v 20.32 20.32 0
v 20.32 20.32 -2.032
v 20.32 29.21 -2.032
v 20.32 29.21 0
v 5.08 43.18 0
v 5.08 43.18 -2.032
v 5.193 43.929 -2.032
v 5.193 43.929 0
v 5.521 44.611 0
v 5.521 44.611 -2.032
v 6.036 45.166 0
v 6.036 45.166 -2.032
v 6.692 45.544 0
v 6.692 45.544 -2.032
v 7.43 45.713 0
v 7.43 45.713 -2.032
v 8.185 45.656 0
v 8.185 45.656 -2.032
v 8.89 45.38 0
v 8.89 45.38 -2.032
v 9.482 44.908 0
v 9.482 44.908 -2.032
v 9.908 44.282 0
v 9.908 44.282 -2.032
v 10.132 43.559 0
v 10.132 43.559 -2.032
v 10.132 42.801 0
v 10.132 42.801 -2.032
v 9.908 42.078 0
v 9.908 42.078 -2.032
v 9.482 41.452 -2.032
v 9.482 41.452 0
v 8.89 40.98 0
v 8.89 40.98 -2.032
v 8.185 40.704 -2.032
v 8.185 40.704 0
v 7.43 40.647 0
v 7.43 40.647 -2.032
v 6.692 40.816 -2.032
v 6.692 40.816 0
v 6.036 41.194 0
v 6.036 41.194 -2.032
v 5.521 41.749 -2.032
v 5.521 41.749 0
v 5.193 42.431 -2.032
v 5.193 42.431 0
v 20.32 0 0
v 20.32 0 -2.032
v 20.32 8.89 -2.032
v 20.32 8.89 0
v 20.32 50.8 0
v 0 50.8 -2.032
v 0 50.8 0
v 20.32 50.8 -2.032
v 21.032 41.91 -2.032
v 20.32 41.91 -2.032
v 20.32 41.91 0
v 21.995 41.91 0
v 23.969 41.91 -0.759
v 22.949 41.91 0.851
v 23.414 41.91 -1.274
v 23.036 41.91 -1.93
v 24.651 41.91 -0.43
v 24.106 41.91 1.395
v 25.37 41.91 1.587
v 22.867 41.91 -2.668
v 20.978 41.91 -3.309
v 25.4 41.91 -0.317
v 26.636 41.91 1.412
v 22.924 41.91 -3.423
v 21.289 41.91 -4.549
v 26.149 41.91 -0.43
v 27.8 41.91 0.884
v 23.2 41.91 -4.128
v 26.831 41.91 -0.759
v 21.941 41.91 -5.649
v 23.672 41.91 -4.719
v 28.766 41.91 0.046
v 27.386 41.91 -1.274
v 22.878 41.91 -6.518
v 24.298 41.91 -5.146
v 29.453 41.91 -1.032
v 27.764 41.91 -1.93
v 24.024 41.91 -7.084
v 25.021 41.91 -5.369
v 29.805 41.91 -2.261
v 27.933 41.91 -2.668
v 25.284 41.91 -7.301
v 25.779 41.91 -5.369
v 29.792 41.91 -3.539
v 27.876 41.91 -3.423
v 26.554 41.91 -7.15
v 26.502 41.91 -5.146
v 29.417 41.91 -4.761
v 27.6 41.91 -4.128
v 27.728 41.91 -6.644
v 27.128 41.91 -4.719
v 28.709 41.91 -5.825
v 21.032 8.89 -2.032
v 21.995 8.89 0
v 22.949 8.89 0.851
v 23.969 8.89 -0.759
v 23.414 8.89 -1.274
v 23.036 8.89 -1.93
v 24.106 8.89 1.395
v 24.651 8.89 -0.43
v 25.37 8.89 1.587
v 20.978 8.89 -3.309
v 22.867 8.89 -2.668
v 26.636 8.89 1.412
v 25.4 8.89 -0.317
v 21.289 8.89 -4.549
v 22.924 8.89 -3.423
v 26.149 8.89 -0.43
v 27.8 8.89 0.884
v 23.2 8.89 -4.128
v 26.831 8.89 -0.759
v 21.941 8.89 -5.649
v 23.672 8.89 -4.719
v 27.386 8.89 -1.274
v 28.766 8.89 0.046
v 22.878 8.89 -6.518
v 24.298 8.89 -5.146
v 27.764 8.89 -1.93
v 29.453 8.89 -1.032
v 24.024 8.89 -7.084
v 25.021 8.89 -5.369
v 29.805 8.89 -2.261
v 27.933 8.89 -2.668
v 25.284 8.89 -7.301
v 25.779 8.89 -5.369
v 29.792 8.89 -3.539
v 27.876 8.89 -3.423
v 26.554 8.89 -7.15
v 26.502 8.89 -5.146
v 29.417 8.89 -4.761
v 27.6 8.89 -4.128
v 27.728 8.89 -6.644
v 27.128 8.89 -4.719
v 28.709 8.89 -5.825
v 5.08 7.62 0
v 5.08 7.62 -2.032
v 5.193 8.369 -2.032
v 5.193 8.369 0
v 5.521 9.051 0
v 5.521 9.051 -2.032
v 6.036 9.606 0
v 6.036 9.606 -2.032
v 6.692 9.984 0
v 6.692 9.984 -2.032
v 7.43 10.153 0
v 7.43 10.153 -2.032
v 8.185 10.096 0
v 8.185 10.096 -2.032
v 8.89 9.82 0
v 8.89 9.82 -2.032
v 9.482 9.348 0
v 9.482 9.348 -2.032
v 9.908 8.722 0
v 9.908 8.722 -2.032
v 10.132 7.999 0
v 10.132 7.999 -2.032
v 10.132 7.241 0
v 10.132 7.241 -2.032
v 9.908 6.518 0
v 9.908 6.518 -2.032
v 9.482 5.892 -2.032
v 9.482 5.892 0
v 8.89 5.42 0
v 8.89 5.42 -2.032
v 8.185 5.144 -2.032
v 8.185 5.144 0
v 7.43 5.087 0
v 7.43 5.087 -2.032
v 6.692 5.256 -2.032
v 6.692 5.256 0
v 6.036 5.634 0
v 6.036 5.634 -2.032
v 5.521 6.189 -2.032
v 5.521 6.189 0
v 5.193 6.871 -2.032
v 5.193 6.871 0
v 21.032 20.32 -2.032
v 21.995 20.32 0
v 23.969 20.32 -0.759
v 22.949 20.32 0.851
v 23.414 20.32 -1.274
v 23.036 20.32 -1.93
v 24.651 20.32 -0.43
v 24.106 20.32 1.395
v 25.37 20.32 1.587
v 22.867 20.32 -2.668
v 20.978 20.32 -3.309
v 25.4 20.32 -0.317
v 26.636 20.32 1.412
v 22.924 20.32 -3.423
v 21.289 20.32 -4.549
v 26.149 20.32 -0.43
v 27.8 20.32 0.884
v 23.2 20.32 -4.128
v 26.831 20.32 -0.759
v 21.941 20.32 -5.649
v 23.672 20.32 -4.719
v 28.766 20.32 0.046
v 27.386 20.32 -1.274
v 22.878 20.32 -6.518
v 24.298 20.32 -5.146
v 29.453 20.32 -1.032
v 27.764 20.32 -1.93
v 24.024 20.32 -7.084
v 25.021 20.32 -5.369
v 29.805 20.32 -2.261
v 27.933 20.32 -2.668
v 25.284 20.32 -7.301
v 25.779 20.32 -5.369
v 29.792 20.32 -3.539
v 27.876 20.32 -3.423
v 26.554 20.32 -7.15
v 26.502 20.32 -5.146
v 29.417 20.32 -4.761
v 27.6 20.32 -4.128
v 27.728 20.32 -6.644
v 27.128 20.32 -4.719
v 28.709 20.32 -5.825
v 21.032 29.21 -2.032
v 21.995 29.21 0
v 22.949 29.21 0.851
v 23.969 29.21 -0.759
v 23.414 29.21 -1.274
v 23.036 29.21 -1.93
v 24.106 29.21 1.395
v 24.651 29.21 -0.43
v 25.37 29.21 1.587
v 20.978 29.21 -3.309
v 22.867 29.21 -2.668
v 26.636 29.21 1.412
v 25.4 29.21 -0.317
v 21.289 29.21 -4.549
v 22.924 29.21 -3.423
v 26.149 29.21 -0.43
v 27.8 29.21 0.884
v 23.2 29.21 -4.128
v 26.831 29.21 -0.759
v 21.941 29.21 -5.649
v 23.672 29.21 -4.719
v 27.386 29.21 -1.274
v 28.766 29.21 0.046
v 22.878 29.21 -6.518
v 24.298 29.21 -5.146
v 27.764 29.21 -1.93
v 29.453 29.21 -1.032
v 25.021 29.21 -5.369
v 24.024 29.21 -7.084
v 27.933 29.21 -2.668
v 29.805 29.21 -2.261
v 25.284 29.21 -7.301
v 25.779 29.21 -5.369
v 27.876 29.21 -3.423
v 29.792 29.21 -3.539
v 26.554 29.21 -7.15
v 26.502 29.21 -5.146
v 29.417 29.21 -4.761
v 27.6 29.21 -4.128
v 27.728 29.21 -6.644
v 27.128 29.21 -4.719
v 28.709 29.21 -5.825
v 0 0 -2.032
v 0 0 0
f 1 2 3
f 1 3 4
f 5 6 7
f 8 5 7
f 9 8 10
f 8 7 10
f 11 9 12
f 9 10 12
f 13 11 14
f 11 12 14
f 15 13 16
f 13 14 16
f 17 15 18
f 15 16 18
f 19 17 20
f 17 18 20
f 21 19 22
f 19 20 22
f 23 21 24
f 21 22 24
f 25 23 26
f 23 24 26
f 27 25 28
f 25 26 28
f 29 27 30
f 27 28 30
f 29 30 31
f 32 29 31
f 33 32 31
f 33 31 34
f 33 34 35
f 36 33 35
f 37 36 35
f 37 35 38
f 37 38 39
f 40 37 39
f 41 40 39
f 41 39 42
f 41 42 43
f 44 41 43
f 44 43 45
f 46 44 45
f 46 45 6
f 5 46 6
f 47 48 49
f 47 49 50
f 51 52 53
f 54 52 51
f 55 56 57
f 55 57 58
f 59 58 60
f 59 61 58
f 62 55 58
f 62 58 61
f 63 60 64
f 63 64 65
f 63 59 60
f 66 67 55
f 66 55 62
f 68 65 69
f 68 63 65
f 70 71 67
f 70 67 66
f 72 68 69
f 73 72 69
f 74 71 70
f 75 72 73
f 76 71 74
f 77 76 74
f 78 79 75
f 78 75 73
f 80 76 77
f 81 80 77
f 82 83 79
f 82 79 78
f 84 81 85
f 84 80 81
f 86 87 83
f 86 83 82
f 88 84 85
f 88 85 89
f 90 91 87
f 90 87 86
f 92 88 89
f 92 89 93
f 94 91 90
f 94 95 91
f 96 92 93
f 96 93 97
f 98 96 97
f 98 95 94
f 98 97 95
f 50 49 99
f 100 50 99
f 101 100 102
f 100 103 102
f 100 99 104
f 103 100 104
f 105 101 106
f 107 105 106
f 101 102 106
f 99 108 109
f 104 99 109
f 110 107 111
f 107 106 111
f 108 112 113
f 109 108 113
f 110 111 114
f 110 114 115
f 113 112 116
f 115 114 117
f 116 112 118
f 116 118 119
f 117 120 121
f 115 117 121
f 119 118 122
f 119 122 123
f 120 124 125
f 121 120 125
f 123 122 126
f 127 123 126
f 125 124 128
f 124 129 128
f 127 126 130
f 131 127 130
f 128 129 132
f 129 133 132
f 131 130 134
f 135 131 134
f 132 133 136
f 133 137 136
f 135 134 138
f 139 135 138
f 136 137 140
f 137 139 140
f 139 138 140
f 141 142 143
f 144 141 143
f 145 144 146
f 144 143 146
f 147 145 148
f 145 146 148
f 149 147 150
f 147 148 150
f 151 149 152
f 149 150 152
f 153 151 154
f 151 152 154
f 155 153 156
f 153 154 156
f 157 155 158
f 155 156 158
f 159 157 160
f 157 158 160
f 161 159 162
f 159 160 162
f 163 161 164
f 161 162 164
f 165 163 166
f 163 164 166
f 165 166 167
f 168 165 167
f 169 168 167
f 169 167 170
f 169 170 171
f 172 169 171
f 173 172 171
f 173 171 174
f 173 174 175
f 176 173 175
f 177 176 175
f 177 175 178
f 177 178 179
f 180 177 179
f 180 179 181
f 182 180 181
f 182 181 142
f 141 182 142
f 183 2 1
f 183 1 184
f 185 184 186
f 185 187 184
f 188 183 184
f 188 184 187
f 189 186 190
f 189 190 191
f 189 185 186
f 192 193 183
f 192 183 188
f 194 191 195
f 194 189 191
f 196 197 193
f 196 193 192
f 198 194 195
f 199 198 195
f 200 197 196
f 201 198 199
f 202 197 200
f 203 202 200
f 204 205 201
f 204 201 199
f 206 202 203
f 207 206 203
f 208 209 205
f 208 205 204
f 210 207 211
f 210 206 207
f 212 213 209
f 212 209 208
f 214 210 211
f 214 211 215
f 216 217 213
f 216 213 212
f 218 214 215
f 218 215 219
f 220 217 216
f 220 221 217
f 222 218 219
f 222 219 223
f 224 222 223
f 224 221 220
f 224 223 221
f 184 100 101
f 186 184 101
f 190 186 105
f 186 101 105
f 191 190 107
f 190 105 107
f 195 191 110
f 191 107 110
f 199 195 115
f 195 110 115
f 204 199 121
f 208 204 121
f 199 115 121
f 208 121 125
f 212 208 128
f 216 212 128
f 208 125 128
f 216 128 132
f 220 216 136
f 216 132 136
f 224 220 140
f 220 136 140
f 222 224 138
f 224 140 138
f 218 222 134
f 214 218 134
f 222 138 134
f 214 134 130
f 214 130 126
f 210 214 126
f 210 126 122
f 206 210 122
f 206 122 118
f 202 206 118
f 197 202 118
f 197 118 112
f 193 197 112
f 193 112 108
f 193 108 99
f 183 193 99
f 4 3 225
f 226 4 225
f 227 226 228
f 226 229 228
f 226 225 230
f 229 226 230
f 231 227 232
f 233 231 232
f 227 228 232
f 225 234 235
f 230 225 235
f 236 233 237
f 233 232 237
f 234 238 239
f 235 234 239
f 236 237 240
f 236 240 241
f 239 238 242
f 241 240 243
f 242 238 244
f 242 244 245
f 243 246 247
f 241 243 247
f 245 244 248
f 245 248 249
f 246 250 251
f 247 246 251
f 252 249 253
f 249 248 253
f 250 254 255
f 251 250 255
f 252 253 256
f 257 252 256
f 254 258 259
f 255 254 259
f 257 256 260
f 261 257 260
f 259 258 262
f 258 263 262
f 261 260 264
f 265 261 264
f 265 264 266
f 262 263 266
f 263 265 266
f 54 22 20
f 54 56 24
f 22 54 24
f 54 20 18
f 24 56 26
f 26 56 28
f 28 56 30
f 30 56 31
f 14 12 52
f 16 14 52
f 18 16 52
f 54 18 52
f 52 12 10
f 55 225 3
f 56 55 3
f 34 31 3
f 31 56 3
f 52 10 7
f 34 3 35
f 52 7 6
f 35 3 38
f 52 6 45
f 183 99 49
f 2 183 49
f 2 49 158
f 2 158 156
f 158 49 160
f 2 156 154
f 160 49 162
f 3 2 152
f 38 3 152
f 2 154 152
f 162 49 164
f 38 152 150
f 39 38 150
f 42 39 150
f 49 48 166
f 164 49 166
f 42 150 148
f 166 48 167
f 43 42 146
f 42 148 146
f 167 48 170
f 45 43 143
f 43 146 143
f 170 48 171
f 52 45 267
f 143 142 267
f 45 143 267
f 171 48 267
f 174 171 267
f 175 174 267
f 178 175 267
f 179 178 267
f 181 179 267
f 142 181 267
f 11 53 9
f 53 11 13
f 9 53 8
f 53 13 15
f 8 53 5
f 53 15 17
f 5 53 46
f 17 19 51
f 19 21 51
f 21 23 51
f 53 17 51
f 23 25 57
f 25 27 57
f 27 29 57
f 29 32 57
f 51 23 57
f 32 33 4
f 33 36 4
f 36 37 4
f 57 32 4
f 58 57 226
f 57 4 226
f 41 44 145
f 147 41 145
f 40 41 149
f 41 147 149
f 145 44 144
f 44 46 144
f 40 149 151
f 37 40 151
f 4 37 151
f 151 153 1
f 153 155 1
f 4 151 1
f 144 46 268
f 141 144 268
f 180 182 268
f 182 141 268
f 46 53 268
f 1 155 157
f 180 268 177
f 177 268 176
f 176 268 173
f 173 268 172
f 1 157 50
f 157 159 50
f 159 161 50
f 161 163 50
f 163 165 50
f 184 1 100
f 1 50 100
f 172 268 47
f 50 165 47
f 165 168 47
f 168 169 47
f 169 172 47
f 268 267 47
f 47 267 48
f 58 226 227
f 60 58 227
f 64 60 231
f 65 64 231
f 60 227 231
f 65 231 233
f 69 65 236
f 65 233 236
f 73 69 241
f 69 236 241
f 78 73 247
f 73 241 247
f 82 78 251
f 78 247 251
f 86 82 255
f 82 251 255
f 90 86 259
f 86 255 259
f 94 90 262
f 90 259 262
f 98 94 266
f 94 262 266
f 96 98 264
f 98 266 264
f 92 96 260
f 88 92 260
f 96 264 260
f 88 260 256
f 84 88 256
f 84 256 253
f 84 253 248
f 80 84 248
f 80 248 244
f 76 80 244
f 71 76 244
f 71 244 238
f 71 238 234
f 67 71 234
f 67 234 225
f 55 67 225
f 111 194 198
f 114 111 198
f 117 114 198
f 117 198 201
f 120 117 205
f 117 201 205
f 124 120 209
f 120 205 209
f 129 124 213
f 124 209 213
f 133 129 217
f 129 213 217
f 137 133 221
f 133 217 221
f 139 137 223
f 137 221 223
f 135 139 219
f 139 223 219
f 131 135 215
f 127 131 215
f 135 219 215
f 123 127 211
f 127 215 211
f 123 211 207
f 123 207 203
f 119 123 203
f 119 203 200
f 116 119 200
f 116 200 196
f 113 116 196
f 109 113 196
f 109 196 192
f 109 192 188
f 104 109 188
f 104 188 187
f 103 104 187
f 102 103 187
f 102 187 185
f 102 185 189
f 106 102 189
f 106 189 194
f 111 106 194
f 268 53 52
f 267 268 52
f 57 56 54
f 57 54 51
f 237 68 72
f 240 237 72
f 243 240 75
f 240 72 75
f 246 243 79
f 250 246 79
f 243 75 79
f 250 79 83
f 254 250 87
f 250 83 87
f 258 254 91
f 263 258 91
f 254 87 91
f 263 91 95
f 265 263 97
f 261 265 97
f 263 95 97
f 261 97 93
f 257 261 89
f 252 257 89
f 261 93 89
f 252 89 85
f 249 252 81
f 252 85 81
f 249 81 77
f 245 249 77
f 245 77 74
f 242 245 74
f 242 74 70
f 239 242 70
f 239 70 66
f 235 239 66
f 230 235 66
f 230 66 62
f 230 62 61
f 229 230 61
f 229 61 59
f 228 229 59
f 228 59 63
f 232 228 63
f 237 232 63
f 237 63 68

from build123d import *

# Parameters (mm, degrees)
BOSS_EXTRUDE1_DEPTH = 50.8
SKETCH2_R           = 2.54
CUT_EXTRUDE1_DEPTH  = 50.8
CUT_EXTRUDE2_DEPTH  = 8.89
CUT_EXTRUDE3_START  = 20.32
CUT_EXTRUDE3_DEPTH  = 8.89
SKETCH3_R           = 2.54
CUT_EXTRUDE4_DEPTH  = 60.369104181
CUT_EXTRUDE5_START  = 41.91
CUT_EXTRUDE5_DEPTH  = 8.89


with BuildPart() as part:
    # Sketch1 → Boss-Extrude1 (new body)
    with BuildSketch(Plane(origin=(0, 0, 0), x_dir=(1, 0, 0), z_dir=(0, 1, 0))):
        with BuildLine():
            Line((0, 0), (21.995191819, 0))
            ThreePointArc((21.995191819, 0), (29.416855136, 4.760891662), (21.032326163, 2.032))
            Line((21.032326163, 2.032), (0, 2.032))
            Line((0, 2.032), (0, 0))
        make_face()
    extrude(amount=BOSS_EXTRUDE1_DEPTH)

    # Sketch2 → Cut-Extrude1 (cut)
    with BuildSketch(Plane(origin=(0, 0, -2.032), x_dir=(-1, 0, 0), z_dir=(0, 0, -1))):
        with Locations((-7.62, 43.18)):
            Circle(SKETCH2_R)
        with Locations((-7.62, 7.62)):
            Circle(SKETCH2_R)
    extrude(amount=-CUT_EXTRUDE1_DEPTH, mode=Mode.SUBTRACT)

    # Sketch1<3> → Cut-Extrude2 (cut)
    with BuildSketch(Plane(origin=(0, 0, 0), x_dir=(1, 0, 0), z_dir=(0, 1, 0))):
        with BuildLine():
            Line((21.032326163, 2.032), (20.32, 2.032))
            Line((20.32, 2.032), (20.32, 0))
            Line((20.32, 0), (21.995191819, 0))
            ThreePointArc((21.995191819, 0), (29.416855136, 4.760891662), (21.032326163, 2.032))
        make_face()
    extrude(amount=CUT_EXTRUDE2_DEPTH, mode=Mode.SUBTRACT)

    # Sketch1<5> → Cut-Extrude3 (cut)
    with BuildSketch(Plane(origin=(0, 0, 0), x_dir=(1, 0, 0), z_dir=(0, 1, 0)).offset(CUT_EXTRUDE3_START)):
        with BuildLine():
            Line((21.032326163, 2.032), (20.32, 2.032))
            Line((20.32, 2.032), (20.32, 0))
            Line((20.32, 0), (21.995191819, 0))
            ThreePointArc((21.995191819, 0), (29.416855136, 4.760891662), (21.032326163, 2.032))
        make_face()
    extrude(amount=CUT_EXTRUDE3_DEPTH, mode=Mode.SUBTRACT)

    # Sketch3 → Cut-Extrude4 (cut, through all)
    with BuildSketch(Plane(origin=(0, 50.8, 0), x_dir=(1, 0, 0), z_dir=(0, 1, 0))):
        with Locations((25.4, 2.8575)):
            Circle(SKETCH3_R)
    extrude(amount=-CUT_EXTRUDE4_DEPTH, mode=Mode.SUBTRACT)

    # Sketch1<6> → Cut-Extrude5 (cut)
    with BuildSketch(Plane(origin=(0, 0, 0), x_dir=(1, 0, 0), z_dir=(0, 1, 0)).offset(CUT_EXTRUDE5_START)):
        with BuildLine():
            Line((21.032326163, 2.032), (20.32, 2.032))
            Line((20.32, 2.032), (20.32, 0))
            Line((20.32, 0), (21.995191819, 0))
            ThreePointArc((21.995191819, 0), (29.416855136, 4.760891662), (21.032326163, 2.032))
        make_face()
    extrude(amount=CUT_EXTRUDE5_DEPTH, mode=Mode.SUBTRACT)


solid = part.part
